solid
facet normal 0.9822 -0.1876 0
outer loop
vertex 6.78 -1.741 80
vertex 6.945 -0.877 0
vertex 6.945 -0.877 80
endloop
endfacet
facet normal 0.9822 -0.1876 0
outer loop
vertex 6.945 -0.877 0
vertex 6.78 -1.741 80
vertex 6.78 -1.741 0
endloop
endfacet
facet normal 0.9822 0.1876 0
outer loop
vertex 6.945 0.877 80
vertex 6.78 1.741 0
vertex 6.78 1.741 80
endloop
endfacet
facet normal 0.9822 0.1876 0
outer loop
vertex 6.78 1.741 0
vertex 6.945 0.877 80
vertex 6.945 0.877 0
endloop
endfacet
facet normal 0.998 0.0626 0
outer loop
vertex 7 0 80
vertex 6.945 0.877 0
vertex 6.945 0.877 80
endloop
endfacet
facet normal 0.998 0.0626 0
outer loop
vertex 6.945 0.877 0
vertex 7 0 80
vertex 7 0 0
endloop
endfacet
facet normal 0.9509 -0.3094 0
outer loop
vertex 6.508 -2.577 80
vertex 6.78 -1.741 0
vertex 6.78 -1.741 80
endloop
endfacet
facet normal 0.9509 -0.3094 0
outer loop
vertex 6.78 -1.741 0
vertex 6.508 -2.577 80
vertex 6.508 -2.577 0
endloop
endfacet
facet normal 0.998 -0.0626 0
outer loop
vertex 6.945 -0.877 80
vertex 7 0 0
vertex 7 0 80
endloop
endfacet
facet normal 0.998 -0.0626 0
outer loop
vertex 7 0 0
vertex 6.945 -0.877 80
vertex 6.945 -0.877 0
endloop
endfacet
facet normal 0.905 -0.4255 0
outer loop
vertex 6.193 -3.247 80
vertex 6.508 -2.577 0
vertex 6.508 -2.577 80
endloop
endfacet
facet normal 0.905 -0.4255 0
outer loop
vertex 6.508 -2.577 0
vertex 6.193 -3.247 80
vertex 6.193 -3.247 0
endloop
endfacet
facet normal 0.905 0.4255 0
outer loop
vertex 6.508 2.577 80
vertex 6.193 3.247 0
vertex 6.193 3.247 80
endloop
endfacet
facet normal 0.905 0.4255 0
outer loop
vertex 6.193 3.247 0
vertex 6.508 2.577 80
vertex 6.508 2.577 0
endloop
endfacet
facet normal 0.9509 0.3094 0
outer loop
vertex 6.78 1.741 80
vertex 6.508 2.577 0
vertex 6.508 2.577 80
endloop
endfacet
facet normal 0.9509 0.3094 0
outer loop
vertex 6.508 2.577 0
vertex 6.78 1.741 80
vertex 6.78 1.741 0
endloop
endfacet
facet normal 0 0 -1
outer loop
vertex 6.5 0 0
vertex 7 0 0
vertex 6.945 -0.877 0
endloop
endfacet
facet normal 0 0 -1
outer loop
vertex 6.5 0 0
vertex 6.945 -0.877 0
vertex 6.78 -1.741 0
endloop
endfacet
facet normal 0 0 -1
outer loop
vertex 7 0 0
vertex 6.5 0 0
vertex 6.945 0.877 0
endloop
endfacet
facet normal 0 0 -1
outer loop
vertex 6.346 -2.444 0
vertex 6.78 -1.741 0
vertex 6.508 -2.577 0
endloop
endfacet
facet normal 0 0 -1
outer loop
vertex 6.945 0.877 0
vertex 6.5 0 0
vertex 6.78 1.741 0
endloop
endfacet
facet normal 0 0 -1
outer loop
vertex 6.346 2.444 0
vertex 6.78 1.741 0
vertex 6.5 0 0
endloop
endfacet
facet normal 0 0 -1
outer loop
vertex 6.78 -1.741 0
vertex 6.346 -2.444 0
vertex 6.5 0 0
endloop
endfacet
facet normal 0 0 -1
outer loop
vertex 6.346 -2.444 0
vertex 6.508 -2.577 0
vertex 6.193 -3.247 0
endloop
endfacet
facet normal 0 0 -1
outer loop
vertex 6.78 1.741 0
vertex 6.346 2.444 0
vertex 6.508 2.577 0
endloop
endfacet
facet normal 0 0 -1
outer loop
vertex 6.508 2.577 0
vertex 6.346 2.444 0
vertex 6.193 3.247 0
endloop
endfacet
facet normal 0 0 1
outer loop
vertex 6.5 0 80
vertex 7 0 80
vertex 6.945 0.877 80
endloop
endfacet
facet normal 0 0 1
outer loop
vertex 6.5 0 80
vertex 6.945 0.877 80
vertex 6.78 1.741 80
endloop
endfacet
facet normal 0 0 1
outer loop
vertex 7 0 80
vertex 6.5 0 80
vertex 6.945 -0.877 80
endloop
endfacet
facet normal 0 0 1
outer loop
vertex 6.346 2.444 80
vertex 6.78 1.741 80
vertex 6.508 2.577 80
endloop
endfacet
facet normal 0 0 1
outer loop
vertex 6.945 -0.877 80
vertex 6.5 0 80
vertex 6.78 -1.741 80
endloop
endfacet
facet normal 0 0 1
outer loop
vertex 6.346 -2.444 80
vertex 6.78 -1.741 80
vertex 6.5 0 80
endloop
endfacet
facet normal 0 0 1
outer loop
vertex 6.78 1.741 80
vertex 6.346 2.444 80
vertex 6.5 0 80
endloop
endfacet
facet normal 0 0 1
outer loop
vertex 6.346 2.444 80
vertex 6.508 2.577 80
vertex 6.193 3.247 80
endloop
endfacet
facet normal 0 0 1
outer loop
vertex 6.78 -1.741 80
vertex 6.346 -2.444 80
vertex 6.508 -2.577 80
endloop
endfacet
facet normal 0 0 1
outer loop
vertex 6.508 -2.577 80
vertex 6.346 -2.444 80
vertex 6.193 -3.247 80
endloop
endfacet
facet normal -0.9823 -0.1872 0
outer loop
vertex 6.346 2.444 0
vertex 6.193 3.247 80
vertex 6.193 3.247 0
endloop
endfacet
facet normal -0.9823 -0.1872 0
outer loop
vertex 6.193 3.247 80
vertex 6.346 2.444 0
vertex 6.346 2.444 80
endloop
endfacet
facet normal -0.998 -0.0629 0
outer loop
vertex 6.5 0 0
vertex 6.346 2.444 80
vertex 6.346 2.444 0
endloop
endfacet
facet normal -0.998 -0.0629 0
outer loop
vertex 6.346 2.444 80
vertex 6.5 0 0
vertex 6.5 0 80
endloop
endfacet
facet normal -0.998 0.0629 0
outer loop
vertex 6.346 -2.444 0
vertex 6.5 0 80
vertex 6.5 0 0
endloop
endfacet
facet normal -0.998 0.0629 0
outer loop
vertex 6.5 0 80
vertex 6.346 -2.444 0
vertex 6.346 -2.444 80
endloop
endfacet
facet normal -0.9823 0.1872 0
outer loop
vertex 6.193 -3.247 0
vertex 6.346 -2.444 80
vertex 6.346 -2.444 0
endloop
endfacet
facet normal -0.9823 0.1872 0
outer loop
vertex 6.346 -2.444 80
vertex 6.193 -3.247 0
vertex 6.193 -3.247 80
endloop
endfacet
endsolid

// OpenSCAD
$fn = 50;


difference() {
	union() {
		cylinder(h = 80, r = 7.0000000000);
		translate(v = [-16.0000000000, 0, 0]) {
			cylinder(h = 80, r = 7.0000000000);
		}
	}
	union() {
		cylinder(h = 80, r = 3.2500000000);
		cylinder(h = 80, r = 1.8000000000);
		cylinder(h = 80, r = 1.8000000000);
		cylinder(h = 80, r = 1.8000000000);
		translate(v = [-20.5000000000, 0, 0]) {
			hull() {
				translate(v = [-3.7500000000, 0.0000000000, 0]) {
					cylinder(h = 80, r = 10.5000000000);
				}
				translate(v = [3.7500000000, 0.0000000000, 0]) {
					cylinder(h = 80, r = 10.5000000000);
				}
				translate(v = [-3.7500000000, -0.0000000000, 0]) {
					cylinder(h = 80, r = 10.5000000000);
				}
				translate(v = [3.7500000000, -0.0000000000, 0]) {
					cylinder(h = 80, r = 10.5000000000);
				}
			}
		}
		translate(v = [-13.0000000000, 0, 0.0000000000]) {
			cylinder(h = 80, r = 19.5000000000);
		}
	}
}
